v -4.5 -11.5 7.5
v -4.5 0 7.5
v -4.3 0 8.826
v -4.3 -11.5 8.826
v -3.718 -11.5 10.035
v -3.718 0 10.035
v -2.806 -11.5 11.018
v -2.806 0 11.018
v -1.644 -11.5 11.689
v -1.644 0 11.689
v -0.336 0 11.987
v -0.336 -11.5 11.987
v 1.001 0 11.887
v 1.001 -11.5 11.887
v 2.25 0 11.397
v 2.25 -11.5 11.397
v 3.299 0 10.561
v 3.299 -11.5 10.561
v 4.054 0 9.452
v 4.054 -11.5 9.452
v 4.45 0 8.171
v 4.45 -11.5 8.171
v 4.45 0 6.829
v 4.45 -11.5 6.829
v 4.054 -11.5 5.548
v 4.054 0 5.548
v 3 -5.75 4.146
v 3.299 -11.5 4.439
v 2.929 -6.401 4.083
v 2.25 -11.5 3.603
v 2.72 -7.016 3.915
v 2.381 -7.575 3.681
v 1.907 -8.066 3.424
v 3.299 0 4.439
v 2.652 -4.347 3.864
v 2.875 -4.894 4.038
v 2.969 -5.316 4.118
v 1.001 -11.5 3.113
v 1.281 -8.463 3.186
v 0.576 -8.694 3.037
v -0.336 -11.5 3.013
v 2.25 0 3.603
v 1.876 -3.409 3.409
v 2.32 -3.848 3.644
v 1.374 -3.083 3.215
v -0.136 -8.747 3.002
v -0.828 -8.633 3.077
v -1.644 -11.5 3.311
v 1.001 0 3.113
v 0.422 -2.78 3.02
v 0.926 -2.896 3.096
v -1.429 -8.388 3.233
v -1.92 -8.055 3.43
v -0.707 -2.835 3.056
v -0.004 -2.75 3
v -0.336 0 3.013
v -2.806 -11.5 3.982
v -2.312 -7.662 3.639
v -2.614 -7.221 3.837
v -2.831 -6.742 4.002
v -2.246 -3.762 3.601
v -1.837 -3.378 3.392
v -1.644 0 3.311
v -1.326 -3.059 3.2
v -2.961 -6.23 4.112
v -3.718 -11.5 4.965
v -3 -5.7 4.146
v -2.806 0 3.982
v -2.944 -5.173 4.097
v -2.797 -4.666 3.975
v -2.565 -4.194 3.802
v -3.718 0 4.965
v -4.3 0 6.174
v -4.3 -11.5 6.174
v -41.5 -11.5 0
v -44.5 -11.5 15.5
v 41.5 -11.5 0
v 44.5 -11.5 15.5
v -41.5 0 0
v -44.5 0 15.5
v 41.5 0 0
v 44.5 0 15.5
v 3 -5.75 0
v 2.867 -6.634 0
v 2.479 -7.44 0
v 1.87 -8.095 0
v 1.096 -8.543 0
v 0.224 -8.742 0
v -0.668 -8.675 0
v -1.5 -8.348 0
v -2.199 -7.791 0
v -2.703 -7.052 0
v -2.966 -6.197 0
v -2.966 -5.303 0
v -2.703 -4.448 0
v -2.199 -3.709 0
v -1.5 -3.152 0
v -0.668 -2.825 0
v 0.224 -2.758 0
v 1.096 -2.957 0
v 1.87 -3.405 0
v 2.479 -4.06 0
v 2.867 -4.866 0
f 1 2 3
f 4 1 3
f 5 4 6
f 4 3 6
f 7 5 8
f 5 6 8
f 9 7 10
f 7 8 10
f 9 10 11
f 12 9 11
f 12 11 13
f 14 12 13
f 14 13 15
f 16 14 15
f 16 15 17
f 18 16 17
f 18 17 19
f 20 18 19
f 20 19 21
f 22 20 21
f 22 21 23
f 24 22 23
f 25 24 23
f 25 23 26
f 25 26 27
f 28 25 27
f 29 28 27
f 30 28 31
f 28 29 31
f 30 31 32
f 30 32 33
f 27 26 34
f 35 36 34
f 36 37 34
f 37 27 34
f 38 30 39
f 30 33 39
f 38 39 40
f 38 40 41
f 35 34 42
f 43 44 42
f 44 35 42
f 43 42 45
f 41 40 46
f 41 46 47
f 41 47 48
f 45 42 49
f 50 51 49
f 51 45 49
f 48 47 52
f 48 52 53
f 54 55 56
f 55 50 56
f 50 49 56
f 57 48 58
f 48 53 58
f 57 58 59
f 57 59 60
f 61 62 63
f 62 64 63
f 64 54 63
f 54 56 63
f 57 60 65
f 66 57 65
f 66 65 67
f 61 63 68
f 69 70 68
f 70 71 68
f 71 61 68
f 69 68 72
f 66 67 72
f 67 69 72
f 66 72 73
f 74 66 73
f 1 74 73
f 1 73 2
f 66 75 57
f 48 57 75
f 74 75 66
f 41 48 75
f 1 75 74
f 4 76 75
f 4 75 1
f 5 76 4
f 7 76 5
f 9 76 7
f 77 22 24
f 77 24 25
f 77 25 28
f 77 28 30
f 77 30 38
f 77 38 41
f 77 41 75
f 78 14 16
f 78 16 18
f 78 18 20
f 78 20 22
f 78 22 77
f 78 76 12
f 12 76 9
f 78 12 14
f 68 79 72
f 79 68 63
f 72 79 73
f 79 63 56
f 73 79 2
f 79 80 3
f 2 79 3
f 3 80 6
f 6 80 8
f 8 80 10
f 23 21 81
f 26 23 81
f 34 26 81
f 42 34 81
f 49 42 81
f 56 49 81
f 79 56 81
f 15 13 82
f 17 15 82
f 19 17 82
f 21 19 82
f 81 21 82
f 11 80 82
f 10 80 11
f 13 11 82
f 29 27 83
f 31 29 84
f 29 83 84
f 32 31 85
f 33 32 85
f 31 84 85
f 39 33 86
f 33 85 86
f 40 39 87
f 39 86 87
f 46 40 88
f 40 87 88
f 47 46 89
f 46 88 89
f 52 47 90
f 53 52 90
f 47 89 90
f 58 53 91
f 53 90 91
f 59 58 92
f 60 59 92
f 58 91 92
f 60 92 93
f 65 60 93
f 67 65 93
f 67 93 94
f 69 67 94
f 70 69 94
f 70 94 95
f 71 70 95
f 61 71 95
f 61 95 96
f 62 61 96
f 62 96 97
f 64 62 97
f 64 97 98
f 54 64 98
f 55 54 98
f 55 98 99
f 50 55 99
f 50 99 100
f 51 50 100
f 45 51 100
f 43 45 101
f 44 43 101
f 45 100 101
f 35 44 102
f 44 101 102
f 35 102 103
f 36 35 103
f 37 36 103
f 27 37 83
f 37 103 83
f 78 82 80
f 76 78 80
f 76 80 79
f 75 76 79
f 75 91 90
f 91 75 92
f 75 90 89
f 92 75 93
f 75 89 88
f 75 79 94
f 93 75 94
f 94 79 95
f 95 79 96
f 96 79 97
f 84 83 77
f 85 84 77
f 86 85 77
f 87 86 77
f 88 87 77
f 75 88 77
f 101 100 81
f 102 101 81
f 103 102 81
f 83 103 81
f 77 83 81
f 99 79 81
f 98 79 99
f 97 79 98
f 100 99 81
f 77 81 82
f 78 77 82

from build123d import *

# Parameters (mm, degrees)
F1_DEPTH = 11.5
F2_R     = 4.5
F3_DEPTH = 11.501
F4_R     = 3
F5_DEPTH = 10


with BuildPart() as f1:
    # F0 (on Front) → F1 (new body)
    with BuildSketch(Plane.XZ):
        Polygon((-44.5, 15.5), (-41.5, 0), (41.5, 0), (44.5, 15.5), align=None)
    extrude(amount=F1_DEPTH)

    # F2 (on face) → F3 (cut, through all)
    with BuildSketch(Plane(origin=(0, 0, 0), x_dir=(-1, 0, 0), z_dir=(0, 1, 0))):
        with Locations((0, 7.5)):
            Circle(F2_R)
    extrude(amount=-F3_DEPTH, mode=Mode.SUBTRACT)

    # F4 (on face) → F5 (cut)
    with BuildSketch(Plane(origin=(0, 0, 0), x_dir=(1, 0, 0), z_dir=(0, 0, -1))):
        with Locations((0, 5.75)):
            Circle(F4_R)
    extrude(amount=-F5_DEPTH, mode=Mode.SUBTRACT)


solid = f1.part
